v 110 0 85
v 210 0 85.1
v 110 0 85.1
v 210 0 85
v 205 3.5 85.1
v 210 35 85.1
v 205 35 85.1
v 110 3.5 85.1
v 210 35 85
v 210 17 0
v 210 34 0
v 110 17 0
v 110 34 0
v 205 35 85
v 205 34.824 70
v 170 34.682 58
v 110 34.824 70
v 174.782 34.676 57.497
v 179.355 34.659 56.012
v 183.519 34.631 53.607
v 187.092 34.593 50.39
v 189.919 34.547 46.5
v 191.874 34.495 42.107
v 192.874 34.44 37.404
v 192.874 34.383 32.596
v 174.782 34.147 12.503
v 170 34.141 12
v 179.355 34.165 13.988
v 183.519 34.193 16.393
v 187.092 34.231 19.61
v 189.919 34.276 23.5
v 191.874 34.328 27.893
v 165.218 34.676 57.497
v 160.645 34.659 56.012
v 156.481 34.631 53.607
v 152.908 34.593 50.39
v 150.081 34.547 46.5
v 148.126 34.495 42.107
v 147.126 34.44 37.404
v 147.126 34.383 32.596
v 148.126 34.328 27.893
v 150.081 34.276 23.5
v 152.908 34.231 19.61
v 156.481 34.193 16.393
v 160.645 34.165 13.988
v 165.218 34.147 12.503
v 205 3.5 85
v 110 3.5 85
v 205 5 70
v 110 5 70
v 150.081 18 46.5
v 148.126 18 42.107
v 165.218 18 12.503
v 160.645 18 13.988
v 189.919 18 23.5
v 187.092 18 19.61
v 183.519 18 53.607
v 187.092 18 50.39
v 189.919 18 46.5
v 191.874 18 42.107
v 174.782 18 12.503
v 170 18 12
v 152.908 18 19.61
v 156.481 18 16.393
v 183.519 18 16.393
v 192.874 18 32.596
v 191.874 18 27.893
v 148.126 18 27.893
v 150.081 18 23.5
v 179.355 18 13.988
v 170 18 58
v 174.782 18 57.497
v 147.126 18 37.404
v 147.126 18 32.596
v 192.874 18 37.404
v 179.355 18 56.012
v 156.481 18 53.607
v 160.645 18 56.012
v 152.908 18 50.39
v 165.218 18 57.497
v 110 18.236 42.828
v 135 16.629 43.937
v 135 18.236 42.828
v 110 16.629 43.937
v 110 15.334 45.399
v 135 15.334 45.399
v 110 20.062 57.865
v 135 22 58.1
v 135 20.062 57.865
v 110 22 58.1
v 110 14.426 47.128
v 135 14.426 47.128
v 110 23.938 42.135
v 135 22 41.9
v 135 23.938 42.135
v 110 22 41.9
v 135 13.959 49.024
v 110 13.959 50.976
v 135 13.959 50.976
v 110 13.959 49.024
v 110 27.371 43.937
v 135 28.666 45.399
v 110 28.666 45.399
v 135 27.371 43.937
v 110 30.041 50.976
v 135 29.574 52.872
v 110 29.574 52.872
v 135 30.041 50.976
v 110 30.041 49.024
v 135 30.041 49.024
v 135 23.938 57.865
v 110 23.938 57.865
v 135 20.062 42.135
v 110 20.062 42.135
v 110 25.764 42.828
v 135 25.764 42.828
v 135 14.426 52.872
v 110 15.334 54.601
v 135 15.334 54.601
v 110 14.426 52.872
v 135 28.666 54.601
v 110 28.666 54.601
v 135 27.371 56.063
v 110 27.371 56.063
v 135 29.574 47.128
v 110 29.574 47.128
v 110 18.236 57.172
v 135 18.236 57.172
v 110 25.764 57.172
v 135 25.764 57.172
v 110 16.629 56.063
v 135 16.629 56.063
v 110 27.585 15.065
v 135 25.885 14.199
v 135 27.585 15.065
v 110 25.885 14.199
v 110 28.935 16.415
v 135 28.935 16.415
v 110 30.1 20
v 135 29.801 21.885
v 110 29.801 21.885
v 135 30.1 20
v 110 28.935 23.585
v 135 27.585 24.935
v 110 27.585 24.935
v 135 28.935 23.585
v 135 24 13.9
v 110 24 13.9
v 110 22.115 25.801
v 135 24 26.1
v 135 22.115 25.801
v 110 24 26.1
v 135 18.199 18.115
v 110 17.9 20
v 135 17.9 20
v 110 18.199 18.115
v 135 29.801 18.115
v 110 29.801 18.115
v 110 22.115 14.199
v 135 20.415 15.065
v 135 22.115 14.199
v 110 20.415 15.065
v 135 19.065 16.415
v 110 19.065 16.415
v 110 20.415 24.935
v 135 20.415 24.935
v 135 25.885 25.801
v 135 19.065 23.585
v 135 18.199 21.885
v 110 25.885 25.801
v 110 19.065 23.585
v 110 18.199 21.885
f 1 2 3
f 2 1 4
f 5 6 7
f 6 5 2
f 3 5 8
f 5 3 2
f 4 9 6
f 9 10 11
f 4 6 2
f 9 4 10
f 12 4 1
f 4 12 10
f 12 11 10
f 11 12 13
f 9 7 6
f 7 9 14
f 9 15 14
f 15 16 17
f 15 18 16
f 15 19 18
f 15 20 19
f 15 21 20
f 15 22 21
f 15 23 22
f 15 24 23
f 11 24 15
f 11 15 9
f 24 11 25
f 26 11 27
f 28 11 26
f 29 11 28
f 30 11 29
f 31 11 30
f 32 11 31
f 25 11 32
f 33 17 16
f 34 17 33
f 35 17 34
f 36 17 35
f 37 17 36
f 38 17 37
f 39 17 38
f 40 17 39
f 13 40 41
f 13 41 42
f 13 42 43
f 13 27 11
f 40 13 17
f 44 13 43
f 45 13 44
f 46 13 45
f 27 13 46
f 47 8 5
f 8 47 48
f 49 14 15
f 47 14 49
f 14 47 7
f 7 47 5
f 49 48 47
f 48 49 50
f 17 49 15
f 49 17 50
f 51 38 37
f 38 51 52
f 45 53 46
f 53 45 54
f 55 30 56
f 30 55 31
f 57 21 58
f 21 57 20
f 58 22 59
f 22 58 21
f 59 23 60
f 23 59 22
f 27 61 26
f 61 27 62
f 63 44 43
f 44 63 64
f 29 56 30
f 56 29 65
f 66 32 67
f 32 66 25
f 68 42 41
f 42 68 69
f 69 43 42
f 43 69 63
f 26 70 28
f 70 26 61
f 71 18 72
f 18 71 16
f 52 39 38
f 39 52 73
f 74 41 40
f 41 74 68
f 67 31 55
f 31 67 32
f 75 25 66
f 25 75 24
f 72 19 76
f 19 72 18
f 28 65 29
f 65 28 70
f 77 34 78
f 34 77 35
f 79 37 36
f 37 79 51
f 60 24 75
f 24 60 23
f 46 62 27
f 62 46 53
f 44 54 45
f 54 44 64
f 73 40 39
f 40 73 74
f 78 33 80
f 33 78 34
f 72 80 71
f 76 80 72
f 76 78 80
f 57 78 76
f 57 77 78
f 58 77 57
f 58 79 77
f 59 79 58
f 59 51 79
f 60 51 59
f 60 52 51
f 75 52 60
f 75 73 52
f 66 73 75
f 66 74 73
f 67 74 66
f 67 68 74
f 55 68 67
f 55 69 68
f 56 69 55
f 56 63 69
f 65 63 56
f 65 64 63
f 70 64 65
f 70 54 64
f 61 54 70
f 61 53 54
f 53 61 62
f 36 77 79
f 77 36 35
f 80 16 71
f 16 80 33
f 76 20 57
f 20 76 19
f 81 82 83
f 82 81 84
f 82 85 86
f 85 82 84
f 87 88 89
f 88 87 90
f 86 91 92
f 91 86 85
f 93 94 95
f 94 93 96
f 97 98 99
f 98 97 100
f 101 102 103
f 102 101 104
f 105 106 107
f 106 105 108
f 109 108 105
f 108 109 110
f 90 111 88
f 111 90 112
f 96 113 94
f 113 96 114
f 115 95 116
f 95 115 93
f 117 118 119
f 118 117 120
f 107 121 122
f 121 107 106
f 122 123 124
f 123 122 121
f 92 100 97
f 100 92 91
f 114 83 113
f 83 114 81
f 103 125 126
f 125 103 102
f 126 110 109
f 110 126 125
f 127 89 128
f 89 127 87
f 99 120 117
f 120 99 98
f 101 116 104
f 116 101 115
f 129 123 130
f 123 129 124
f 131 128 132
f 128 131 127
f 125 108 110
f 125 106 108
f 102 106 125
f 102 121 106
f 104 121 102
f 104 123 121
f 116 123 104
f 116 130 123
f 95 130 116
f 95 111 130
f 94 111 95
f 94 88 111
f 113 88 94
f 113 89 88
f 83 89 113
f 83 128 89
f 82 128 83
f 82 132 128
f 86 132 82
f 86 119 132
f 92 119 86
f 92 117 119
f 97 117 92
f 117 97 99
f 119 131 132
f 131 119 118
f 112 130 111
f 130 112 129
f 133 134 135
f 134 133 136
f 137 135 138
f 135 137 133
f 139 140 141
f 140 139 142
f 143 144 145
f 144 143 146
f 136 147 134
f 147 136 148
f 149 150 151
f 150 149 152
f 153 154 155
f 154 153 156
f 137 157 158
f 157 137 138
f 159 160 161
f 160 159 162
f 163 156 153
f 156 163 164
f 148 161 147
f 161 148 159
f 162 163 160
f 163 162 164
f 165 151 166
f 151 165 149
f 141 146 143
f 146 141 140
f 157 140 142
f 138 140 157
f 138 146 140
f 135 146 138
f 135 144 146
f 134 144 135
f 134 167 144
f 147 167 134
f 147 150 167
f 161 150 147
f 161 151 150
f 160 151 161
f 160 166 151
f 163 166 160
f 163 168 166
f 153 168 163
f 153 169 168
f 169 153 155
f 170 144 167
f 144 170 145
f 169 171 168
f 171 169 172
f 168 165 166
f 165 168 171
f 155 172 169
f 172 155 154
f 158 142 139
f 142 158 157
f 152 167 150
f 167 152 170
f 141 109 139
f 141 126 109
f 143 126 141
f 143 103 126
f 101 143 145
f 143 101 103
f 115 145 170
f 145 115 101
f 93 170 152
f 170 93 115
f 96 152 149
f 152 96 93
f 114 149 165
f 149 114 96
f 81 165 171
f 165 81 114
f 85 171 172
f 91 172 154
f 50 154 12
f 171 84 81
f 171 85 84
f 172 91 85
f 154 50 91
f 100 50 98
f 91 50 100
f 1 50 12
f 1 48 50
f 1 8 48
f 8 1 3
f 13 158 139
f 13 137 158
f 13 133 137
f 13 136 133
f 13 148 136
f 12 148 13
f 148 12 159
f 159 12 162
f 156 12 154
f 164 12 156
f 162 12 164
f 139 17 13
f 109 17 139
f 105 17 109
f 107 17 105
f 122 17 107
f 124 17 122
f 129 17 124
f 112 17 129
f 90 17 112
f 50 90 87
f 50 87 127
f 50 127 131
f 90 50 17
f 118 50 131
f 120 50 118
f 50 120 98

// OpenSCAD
echo(version=version());

difference() {
	hull(){
		translate([0, 17, 0]) cube([210, 17, 0.1]);
		translate([0, 0, 85]) cube([210, 35, 0.1]);
	}
	hull(){
		translate([5, 5, 70]) cube([200, 30, 0.1]);
		translate([5, 3.5, 85]) cube([200, 32, 0.1]);
	}
	translate([40, 28, 35]) rotate([90, 90, 0]) cylinder(h=20, r=23, center=true);
	translate([170, 28, 35]) rotate([90, 90, 0]) cylinder(h=20, r=23, center=true);
	translate([120, 22, 50]) rotate([90, 90, 90]) cylinder(h=30, r=8.1, center=true);
	translate([120, 24, 20]) rotate([90, 90, 90]) cylinder(h=30, r=6.1, center=true);

	*translate([105, 0, -10]) cube([110, 50, 110]);
	translate([0, 0, -10]) cube([110, 50, 110]);
}


*translate([105, 22, 50]) rotate([90, 90, 90]) cylinder(h=30, r=8, center=true);
*translate([105, 24, 20]) rotate([90, 90, 90]) cylinder(h=30, r=6, center=true);
